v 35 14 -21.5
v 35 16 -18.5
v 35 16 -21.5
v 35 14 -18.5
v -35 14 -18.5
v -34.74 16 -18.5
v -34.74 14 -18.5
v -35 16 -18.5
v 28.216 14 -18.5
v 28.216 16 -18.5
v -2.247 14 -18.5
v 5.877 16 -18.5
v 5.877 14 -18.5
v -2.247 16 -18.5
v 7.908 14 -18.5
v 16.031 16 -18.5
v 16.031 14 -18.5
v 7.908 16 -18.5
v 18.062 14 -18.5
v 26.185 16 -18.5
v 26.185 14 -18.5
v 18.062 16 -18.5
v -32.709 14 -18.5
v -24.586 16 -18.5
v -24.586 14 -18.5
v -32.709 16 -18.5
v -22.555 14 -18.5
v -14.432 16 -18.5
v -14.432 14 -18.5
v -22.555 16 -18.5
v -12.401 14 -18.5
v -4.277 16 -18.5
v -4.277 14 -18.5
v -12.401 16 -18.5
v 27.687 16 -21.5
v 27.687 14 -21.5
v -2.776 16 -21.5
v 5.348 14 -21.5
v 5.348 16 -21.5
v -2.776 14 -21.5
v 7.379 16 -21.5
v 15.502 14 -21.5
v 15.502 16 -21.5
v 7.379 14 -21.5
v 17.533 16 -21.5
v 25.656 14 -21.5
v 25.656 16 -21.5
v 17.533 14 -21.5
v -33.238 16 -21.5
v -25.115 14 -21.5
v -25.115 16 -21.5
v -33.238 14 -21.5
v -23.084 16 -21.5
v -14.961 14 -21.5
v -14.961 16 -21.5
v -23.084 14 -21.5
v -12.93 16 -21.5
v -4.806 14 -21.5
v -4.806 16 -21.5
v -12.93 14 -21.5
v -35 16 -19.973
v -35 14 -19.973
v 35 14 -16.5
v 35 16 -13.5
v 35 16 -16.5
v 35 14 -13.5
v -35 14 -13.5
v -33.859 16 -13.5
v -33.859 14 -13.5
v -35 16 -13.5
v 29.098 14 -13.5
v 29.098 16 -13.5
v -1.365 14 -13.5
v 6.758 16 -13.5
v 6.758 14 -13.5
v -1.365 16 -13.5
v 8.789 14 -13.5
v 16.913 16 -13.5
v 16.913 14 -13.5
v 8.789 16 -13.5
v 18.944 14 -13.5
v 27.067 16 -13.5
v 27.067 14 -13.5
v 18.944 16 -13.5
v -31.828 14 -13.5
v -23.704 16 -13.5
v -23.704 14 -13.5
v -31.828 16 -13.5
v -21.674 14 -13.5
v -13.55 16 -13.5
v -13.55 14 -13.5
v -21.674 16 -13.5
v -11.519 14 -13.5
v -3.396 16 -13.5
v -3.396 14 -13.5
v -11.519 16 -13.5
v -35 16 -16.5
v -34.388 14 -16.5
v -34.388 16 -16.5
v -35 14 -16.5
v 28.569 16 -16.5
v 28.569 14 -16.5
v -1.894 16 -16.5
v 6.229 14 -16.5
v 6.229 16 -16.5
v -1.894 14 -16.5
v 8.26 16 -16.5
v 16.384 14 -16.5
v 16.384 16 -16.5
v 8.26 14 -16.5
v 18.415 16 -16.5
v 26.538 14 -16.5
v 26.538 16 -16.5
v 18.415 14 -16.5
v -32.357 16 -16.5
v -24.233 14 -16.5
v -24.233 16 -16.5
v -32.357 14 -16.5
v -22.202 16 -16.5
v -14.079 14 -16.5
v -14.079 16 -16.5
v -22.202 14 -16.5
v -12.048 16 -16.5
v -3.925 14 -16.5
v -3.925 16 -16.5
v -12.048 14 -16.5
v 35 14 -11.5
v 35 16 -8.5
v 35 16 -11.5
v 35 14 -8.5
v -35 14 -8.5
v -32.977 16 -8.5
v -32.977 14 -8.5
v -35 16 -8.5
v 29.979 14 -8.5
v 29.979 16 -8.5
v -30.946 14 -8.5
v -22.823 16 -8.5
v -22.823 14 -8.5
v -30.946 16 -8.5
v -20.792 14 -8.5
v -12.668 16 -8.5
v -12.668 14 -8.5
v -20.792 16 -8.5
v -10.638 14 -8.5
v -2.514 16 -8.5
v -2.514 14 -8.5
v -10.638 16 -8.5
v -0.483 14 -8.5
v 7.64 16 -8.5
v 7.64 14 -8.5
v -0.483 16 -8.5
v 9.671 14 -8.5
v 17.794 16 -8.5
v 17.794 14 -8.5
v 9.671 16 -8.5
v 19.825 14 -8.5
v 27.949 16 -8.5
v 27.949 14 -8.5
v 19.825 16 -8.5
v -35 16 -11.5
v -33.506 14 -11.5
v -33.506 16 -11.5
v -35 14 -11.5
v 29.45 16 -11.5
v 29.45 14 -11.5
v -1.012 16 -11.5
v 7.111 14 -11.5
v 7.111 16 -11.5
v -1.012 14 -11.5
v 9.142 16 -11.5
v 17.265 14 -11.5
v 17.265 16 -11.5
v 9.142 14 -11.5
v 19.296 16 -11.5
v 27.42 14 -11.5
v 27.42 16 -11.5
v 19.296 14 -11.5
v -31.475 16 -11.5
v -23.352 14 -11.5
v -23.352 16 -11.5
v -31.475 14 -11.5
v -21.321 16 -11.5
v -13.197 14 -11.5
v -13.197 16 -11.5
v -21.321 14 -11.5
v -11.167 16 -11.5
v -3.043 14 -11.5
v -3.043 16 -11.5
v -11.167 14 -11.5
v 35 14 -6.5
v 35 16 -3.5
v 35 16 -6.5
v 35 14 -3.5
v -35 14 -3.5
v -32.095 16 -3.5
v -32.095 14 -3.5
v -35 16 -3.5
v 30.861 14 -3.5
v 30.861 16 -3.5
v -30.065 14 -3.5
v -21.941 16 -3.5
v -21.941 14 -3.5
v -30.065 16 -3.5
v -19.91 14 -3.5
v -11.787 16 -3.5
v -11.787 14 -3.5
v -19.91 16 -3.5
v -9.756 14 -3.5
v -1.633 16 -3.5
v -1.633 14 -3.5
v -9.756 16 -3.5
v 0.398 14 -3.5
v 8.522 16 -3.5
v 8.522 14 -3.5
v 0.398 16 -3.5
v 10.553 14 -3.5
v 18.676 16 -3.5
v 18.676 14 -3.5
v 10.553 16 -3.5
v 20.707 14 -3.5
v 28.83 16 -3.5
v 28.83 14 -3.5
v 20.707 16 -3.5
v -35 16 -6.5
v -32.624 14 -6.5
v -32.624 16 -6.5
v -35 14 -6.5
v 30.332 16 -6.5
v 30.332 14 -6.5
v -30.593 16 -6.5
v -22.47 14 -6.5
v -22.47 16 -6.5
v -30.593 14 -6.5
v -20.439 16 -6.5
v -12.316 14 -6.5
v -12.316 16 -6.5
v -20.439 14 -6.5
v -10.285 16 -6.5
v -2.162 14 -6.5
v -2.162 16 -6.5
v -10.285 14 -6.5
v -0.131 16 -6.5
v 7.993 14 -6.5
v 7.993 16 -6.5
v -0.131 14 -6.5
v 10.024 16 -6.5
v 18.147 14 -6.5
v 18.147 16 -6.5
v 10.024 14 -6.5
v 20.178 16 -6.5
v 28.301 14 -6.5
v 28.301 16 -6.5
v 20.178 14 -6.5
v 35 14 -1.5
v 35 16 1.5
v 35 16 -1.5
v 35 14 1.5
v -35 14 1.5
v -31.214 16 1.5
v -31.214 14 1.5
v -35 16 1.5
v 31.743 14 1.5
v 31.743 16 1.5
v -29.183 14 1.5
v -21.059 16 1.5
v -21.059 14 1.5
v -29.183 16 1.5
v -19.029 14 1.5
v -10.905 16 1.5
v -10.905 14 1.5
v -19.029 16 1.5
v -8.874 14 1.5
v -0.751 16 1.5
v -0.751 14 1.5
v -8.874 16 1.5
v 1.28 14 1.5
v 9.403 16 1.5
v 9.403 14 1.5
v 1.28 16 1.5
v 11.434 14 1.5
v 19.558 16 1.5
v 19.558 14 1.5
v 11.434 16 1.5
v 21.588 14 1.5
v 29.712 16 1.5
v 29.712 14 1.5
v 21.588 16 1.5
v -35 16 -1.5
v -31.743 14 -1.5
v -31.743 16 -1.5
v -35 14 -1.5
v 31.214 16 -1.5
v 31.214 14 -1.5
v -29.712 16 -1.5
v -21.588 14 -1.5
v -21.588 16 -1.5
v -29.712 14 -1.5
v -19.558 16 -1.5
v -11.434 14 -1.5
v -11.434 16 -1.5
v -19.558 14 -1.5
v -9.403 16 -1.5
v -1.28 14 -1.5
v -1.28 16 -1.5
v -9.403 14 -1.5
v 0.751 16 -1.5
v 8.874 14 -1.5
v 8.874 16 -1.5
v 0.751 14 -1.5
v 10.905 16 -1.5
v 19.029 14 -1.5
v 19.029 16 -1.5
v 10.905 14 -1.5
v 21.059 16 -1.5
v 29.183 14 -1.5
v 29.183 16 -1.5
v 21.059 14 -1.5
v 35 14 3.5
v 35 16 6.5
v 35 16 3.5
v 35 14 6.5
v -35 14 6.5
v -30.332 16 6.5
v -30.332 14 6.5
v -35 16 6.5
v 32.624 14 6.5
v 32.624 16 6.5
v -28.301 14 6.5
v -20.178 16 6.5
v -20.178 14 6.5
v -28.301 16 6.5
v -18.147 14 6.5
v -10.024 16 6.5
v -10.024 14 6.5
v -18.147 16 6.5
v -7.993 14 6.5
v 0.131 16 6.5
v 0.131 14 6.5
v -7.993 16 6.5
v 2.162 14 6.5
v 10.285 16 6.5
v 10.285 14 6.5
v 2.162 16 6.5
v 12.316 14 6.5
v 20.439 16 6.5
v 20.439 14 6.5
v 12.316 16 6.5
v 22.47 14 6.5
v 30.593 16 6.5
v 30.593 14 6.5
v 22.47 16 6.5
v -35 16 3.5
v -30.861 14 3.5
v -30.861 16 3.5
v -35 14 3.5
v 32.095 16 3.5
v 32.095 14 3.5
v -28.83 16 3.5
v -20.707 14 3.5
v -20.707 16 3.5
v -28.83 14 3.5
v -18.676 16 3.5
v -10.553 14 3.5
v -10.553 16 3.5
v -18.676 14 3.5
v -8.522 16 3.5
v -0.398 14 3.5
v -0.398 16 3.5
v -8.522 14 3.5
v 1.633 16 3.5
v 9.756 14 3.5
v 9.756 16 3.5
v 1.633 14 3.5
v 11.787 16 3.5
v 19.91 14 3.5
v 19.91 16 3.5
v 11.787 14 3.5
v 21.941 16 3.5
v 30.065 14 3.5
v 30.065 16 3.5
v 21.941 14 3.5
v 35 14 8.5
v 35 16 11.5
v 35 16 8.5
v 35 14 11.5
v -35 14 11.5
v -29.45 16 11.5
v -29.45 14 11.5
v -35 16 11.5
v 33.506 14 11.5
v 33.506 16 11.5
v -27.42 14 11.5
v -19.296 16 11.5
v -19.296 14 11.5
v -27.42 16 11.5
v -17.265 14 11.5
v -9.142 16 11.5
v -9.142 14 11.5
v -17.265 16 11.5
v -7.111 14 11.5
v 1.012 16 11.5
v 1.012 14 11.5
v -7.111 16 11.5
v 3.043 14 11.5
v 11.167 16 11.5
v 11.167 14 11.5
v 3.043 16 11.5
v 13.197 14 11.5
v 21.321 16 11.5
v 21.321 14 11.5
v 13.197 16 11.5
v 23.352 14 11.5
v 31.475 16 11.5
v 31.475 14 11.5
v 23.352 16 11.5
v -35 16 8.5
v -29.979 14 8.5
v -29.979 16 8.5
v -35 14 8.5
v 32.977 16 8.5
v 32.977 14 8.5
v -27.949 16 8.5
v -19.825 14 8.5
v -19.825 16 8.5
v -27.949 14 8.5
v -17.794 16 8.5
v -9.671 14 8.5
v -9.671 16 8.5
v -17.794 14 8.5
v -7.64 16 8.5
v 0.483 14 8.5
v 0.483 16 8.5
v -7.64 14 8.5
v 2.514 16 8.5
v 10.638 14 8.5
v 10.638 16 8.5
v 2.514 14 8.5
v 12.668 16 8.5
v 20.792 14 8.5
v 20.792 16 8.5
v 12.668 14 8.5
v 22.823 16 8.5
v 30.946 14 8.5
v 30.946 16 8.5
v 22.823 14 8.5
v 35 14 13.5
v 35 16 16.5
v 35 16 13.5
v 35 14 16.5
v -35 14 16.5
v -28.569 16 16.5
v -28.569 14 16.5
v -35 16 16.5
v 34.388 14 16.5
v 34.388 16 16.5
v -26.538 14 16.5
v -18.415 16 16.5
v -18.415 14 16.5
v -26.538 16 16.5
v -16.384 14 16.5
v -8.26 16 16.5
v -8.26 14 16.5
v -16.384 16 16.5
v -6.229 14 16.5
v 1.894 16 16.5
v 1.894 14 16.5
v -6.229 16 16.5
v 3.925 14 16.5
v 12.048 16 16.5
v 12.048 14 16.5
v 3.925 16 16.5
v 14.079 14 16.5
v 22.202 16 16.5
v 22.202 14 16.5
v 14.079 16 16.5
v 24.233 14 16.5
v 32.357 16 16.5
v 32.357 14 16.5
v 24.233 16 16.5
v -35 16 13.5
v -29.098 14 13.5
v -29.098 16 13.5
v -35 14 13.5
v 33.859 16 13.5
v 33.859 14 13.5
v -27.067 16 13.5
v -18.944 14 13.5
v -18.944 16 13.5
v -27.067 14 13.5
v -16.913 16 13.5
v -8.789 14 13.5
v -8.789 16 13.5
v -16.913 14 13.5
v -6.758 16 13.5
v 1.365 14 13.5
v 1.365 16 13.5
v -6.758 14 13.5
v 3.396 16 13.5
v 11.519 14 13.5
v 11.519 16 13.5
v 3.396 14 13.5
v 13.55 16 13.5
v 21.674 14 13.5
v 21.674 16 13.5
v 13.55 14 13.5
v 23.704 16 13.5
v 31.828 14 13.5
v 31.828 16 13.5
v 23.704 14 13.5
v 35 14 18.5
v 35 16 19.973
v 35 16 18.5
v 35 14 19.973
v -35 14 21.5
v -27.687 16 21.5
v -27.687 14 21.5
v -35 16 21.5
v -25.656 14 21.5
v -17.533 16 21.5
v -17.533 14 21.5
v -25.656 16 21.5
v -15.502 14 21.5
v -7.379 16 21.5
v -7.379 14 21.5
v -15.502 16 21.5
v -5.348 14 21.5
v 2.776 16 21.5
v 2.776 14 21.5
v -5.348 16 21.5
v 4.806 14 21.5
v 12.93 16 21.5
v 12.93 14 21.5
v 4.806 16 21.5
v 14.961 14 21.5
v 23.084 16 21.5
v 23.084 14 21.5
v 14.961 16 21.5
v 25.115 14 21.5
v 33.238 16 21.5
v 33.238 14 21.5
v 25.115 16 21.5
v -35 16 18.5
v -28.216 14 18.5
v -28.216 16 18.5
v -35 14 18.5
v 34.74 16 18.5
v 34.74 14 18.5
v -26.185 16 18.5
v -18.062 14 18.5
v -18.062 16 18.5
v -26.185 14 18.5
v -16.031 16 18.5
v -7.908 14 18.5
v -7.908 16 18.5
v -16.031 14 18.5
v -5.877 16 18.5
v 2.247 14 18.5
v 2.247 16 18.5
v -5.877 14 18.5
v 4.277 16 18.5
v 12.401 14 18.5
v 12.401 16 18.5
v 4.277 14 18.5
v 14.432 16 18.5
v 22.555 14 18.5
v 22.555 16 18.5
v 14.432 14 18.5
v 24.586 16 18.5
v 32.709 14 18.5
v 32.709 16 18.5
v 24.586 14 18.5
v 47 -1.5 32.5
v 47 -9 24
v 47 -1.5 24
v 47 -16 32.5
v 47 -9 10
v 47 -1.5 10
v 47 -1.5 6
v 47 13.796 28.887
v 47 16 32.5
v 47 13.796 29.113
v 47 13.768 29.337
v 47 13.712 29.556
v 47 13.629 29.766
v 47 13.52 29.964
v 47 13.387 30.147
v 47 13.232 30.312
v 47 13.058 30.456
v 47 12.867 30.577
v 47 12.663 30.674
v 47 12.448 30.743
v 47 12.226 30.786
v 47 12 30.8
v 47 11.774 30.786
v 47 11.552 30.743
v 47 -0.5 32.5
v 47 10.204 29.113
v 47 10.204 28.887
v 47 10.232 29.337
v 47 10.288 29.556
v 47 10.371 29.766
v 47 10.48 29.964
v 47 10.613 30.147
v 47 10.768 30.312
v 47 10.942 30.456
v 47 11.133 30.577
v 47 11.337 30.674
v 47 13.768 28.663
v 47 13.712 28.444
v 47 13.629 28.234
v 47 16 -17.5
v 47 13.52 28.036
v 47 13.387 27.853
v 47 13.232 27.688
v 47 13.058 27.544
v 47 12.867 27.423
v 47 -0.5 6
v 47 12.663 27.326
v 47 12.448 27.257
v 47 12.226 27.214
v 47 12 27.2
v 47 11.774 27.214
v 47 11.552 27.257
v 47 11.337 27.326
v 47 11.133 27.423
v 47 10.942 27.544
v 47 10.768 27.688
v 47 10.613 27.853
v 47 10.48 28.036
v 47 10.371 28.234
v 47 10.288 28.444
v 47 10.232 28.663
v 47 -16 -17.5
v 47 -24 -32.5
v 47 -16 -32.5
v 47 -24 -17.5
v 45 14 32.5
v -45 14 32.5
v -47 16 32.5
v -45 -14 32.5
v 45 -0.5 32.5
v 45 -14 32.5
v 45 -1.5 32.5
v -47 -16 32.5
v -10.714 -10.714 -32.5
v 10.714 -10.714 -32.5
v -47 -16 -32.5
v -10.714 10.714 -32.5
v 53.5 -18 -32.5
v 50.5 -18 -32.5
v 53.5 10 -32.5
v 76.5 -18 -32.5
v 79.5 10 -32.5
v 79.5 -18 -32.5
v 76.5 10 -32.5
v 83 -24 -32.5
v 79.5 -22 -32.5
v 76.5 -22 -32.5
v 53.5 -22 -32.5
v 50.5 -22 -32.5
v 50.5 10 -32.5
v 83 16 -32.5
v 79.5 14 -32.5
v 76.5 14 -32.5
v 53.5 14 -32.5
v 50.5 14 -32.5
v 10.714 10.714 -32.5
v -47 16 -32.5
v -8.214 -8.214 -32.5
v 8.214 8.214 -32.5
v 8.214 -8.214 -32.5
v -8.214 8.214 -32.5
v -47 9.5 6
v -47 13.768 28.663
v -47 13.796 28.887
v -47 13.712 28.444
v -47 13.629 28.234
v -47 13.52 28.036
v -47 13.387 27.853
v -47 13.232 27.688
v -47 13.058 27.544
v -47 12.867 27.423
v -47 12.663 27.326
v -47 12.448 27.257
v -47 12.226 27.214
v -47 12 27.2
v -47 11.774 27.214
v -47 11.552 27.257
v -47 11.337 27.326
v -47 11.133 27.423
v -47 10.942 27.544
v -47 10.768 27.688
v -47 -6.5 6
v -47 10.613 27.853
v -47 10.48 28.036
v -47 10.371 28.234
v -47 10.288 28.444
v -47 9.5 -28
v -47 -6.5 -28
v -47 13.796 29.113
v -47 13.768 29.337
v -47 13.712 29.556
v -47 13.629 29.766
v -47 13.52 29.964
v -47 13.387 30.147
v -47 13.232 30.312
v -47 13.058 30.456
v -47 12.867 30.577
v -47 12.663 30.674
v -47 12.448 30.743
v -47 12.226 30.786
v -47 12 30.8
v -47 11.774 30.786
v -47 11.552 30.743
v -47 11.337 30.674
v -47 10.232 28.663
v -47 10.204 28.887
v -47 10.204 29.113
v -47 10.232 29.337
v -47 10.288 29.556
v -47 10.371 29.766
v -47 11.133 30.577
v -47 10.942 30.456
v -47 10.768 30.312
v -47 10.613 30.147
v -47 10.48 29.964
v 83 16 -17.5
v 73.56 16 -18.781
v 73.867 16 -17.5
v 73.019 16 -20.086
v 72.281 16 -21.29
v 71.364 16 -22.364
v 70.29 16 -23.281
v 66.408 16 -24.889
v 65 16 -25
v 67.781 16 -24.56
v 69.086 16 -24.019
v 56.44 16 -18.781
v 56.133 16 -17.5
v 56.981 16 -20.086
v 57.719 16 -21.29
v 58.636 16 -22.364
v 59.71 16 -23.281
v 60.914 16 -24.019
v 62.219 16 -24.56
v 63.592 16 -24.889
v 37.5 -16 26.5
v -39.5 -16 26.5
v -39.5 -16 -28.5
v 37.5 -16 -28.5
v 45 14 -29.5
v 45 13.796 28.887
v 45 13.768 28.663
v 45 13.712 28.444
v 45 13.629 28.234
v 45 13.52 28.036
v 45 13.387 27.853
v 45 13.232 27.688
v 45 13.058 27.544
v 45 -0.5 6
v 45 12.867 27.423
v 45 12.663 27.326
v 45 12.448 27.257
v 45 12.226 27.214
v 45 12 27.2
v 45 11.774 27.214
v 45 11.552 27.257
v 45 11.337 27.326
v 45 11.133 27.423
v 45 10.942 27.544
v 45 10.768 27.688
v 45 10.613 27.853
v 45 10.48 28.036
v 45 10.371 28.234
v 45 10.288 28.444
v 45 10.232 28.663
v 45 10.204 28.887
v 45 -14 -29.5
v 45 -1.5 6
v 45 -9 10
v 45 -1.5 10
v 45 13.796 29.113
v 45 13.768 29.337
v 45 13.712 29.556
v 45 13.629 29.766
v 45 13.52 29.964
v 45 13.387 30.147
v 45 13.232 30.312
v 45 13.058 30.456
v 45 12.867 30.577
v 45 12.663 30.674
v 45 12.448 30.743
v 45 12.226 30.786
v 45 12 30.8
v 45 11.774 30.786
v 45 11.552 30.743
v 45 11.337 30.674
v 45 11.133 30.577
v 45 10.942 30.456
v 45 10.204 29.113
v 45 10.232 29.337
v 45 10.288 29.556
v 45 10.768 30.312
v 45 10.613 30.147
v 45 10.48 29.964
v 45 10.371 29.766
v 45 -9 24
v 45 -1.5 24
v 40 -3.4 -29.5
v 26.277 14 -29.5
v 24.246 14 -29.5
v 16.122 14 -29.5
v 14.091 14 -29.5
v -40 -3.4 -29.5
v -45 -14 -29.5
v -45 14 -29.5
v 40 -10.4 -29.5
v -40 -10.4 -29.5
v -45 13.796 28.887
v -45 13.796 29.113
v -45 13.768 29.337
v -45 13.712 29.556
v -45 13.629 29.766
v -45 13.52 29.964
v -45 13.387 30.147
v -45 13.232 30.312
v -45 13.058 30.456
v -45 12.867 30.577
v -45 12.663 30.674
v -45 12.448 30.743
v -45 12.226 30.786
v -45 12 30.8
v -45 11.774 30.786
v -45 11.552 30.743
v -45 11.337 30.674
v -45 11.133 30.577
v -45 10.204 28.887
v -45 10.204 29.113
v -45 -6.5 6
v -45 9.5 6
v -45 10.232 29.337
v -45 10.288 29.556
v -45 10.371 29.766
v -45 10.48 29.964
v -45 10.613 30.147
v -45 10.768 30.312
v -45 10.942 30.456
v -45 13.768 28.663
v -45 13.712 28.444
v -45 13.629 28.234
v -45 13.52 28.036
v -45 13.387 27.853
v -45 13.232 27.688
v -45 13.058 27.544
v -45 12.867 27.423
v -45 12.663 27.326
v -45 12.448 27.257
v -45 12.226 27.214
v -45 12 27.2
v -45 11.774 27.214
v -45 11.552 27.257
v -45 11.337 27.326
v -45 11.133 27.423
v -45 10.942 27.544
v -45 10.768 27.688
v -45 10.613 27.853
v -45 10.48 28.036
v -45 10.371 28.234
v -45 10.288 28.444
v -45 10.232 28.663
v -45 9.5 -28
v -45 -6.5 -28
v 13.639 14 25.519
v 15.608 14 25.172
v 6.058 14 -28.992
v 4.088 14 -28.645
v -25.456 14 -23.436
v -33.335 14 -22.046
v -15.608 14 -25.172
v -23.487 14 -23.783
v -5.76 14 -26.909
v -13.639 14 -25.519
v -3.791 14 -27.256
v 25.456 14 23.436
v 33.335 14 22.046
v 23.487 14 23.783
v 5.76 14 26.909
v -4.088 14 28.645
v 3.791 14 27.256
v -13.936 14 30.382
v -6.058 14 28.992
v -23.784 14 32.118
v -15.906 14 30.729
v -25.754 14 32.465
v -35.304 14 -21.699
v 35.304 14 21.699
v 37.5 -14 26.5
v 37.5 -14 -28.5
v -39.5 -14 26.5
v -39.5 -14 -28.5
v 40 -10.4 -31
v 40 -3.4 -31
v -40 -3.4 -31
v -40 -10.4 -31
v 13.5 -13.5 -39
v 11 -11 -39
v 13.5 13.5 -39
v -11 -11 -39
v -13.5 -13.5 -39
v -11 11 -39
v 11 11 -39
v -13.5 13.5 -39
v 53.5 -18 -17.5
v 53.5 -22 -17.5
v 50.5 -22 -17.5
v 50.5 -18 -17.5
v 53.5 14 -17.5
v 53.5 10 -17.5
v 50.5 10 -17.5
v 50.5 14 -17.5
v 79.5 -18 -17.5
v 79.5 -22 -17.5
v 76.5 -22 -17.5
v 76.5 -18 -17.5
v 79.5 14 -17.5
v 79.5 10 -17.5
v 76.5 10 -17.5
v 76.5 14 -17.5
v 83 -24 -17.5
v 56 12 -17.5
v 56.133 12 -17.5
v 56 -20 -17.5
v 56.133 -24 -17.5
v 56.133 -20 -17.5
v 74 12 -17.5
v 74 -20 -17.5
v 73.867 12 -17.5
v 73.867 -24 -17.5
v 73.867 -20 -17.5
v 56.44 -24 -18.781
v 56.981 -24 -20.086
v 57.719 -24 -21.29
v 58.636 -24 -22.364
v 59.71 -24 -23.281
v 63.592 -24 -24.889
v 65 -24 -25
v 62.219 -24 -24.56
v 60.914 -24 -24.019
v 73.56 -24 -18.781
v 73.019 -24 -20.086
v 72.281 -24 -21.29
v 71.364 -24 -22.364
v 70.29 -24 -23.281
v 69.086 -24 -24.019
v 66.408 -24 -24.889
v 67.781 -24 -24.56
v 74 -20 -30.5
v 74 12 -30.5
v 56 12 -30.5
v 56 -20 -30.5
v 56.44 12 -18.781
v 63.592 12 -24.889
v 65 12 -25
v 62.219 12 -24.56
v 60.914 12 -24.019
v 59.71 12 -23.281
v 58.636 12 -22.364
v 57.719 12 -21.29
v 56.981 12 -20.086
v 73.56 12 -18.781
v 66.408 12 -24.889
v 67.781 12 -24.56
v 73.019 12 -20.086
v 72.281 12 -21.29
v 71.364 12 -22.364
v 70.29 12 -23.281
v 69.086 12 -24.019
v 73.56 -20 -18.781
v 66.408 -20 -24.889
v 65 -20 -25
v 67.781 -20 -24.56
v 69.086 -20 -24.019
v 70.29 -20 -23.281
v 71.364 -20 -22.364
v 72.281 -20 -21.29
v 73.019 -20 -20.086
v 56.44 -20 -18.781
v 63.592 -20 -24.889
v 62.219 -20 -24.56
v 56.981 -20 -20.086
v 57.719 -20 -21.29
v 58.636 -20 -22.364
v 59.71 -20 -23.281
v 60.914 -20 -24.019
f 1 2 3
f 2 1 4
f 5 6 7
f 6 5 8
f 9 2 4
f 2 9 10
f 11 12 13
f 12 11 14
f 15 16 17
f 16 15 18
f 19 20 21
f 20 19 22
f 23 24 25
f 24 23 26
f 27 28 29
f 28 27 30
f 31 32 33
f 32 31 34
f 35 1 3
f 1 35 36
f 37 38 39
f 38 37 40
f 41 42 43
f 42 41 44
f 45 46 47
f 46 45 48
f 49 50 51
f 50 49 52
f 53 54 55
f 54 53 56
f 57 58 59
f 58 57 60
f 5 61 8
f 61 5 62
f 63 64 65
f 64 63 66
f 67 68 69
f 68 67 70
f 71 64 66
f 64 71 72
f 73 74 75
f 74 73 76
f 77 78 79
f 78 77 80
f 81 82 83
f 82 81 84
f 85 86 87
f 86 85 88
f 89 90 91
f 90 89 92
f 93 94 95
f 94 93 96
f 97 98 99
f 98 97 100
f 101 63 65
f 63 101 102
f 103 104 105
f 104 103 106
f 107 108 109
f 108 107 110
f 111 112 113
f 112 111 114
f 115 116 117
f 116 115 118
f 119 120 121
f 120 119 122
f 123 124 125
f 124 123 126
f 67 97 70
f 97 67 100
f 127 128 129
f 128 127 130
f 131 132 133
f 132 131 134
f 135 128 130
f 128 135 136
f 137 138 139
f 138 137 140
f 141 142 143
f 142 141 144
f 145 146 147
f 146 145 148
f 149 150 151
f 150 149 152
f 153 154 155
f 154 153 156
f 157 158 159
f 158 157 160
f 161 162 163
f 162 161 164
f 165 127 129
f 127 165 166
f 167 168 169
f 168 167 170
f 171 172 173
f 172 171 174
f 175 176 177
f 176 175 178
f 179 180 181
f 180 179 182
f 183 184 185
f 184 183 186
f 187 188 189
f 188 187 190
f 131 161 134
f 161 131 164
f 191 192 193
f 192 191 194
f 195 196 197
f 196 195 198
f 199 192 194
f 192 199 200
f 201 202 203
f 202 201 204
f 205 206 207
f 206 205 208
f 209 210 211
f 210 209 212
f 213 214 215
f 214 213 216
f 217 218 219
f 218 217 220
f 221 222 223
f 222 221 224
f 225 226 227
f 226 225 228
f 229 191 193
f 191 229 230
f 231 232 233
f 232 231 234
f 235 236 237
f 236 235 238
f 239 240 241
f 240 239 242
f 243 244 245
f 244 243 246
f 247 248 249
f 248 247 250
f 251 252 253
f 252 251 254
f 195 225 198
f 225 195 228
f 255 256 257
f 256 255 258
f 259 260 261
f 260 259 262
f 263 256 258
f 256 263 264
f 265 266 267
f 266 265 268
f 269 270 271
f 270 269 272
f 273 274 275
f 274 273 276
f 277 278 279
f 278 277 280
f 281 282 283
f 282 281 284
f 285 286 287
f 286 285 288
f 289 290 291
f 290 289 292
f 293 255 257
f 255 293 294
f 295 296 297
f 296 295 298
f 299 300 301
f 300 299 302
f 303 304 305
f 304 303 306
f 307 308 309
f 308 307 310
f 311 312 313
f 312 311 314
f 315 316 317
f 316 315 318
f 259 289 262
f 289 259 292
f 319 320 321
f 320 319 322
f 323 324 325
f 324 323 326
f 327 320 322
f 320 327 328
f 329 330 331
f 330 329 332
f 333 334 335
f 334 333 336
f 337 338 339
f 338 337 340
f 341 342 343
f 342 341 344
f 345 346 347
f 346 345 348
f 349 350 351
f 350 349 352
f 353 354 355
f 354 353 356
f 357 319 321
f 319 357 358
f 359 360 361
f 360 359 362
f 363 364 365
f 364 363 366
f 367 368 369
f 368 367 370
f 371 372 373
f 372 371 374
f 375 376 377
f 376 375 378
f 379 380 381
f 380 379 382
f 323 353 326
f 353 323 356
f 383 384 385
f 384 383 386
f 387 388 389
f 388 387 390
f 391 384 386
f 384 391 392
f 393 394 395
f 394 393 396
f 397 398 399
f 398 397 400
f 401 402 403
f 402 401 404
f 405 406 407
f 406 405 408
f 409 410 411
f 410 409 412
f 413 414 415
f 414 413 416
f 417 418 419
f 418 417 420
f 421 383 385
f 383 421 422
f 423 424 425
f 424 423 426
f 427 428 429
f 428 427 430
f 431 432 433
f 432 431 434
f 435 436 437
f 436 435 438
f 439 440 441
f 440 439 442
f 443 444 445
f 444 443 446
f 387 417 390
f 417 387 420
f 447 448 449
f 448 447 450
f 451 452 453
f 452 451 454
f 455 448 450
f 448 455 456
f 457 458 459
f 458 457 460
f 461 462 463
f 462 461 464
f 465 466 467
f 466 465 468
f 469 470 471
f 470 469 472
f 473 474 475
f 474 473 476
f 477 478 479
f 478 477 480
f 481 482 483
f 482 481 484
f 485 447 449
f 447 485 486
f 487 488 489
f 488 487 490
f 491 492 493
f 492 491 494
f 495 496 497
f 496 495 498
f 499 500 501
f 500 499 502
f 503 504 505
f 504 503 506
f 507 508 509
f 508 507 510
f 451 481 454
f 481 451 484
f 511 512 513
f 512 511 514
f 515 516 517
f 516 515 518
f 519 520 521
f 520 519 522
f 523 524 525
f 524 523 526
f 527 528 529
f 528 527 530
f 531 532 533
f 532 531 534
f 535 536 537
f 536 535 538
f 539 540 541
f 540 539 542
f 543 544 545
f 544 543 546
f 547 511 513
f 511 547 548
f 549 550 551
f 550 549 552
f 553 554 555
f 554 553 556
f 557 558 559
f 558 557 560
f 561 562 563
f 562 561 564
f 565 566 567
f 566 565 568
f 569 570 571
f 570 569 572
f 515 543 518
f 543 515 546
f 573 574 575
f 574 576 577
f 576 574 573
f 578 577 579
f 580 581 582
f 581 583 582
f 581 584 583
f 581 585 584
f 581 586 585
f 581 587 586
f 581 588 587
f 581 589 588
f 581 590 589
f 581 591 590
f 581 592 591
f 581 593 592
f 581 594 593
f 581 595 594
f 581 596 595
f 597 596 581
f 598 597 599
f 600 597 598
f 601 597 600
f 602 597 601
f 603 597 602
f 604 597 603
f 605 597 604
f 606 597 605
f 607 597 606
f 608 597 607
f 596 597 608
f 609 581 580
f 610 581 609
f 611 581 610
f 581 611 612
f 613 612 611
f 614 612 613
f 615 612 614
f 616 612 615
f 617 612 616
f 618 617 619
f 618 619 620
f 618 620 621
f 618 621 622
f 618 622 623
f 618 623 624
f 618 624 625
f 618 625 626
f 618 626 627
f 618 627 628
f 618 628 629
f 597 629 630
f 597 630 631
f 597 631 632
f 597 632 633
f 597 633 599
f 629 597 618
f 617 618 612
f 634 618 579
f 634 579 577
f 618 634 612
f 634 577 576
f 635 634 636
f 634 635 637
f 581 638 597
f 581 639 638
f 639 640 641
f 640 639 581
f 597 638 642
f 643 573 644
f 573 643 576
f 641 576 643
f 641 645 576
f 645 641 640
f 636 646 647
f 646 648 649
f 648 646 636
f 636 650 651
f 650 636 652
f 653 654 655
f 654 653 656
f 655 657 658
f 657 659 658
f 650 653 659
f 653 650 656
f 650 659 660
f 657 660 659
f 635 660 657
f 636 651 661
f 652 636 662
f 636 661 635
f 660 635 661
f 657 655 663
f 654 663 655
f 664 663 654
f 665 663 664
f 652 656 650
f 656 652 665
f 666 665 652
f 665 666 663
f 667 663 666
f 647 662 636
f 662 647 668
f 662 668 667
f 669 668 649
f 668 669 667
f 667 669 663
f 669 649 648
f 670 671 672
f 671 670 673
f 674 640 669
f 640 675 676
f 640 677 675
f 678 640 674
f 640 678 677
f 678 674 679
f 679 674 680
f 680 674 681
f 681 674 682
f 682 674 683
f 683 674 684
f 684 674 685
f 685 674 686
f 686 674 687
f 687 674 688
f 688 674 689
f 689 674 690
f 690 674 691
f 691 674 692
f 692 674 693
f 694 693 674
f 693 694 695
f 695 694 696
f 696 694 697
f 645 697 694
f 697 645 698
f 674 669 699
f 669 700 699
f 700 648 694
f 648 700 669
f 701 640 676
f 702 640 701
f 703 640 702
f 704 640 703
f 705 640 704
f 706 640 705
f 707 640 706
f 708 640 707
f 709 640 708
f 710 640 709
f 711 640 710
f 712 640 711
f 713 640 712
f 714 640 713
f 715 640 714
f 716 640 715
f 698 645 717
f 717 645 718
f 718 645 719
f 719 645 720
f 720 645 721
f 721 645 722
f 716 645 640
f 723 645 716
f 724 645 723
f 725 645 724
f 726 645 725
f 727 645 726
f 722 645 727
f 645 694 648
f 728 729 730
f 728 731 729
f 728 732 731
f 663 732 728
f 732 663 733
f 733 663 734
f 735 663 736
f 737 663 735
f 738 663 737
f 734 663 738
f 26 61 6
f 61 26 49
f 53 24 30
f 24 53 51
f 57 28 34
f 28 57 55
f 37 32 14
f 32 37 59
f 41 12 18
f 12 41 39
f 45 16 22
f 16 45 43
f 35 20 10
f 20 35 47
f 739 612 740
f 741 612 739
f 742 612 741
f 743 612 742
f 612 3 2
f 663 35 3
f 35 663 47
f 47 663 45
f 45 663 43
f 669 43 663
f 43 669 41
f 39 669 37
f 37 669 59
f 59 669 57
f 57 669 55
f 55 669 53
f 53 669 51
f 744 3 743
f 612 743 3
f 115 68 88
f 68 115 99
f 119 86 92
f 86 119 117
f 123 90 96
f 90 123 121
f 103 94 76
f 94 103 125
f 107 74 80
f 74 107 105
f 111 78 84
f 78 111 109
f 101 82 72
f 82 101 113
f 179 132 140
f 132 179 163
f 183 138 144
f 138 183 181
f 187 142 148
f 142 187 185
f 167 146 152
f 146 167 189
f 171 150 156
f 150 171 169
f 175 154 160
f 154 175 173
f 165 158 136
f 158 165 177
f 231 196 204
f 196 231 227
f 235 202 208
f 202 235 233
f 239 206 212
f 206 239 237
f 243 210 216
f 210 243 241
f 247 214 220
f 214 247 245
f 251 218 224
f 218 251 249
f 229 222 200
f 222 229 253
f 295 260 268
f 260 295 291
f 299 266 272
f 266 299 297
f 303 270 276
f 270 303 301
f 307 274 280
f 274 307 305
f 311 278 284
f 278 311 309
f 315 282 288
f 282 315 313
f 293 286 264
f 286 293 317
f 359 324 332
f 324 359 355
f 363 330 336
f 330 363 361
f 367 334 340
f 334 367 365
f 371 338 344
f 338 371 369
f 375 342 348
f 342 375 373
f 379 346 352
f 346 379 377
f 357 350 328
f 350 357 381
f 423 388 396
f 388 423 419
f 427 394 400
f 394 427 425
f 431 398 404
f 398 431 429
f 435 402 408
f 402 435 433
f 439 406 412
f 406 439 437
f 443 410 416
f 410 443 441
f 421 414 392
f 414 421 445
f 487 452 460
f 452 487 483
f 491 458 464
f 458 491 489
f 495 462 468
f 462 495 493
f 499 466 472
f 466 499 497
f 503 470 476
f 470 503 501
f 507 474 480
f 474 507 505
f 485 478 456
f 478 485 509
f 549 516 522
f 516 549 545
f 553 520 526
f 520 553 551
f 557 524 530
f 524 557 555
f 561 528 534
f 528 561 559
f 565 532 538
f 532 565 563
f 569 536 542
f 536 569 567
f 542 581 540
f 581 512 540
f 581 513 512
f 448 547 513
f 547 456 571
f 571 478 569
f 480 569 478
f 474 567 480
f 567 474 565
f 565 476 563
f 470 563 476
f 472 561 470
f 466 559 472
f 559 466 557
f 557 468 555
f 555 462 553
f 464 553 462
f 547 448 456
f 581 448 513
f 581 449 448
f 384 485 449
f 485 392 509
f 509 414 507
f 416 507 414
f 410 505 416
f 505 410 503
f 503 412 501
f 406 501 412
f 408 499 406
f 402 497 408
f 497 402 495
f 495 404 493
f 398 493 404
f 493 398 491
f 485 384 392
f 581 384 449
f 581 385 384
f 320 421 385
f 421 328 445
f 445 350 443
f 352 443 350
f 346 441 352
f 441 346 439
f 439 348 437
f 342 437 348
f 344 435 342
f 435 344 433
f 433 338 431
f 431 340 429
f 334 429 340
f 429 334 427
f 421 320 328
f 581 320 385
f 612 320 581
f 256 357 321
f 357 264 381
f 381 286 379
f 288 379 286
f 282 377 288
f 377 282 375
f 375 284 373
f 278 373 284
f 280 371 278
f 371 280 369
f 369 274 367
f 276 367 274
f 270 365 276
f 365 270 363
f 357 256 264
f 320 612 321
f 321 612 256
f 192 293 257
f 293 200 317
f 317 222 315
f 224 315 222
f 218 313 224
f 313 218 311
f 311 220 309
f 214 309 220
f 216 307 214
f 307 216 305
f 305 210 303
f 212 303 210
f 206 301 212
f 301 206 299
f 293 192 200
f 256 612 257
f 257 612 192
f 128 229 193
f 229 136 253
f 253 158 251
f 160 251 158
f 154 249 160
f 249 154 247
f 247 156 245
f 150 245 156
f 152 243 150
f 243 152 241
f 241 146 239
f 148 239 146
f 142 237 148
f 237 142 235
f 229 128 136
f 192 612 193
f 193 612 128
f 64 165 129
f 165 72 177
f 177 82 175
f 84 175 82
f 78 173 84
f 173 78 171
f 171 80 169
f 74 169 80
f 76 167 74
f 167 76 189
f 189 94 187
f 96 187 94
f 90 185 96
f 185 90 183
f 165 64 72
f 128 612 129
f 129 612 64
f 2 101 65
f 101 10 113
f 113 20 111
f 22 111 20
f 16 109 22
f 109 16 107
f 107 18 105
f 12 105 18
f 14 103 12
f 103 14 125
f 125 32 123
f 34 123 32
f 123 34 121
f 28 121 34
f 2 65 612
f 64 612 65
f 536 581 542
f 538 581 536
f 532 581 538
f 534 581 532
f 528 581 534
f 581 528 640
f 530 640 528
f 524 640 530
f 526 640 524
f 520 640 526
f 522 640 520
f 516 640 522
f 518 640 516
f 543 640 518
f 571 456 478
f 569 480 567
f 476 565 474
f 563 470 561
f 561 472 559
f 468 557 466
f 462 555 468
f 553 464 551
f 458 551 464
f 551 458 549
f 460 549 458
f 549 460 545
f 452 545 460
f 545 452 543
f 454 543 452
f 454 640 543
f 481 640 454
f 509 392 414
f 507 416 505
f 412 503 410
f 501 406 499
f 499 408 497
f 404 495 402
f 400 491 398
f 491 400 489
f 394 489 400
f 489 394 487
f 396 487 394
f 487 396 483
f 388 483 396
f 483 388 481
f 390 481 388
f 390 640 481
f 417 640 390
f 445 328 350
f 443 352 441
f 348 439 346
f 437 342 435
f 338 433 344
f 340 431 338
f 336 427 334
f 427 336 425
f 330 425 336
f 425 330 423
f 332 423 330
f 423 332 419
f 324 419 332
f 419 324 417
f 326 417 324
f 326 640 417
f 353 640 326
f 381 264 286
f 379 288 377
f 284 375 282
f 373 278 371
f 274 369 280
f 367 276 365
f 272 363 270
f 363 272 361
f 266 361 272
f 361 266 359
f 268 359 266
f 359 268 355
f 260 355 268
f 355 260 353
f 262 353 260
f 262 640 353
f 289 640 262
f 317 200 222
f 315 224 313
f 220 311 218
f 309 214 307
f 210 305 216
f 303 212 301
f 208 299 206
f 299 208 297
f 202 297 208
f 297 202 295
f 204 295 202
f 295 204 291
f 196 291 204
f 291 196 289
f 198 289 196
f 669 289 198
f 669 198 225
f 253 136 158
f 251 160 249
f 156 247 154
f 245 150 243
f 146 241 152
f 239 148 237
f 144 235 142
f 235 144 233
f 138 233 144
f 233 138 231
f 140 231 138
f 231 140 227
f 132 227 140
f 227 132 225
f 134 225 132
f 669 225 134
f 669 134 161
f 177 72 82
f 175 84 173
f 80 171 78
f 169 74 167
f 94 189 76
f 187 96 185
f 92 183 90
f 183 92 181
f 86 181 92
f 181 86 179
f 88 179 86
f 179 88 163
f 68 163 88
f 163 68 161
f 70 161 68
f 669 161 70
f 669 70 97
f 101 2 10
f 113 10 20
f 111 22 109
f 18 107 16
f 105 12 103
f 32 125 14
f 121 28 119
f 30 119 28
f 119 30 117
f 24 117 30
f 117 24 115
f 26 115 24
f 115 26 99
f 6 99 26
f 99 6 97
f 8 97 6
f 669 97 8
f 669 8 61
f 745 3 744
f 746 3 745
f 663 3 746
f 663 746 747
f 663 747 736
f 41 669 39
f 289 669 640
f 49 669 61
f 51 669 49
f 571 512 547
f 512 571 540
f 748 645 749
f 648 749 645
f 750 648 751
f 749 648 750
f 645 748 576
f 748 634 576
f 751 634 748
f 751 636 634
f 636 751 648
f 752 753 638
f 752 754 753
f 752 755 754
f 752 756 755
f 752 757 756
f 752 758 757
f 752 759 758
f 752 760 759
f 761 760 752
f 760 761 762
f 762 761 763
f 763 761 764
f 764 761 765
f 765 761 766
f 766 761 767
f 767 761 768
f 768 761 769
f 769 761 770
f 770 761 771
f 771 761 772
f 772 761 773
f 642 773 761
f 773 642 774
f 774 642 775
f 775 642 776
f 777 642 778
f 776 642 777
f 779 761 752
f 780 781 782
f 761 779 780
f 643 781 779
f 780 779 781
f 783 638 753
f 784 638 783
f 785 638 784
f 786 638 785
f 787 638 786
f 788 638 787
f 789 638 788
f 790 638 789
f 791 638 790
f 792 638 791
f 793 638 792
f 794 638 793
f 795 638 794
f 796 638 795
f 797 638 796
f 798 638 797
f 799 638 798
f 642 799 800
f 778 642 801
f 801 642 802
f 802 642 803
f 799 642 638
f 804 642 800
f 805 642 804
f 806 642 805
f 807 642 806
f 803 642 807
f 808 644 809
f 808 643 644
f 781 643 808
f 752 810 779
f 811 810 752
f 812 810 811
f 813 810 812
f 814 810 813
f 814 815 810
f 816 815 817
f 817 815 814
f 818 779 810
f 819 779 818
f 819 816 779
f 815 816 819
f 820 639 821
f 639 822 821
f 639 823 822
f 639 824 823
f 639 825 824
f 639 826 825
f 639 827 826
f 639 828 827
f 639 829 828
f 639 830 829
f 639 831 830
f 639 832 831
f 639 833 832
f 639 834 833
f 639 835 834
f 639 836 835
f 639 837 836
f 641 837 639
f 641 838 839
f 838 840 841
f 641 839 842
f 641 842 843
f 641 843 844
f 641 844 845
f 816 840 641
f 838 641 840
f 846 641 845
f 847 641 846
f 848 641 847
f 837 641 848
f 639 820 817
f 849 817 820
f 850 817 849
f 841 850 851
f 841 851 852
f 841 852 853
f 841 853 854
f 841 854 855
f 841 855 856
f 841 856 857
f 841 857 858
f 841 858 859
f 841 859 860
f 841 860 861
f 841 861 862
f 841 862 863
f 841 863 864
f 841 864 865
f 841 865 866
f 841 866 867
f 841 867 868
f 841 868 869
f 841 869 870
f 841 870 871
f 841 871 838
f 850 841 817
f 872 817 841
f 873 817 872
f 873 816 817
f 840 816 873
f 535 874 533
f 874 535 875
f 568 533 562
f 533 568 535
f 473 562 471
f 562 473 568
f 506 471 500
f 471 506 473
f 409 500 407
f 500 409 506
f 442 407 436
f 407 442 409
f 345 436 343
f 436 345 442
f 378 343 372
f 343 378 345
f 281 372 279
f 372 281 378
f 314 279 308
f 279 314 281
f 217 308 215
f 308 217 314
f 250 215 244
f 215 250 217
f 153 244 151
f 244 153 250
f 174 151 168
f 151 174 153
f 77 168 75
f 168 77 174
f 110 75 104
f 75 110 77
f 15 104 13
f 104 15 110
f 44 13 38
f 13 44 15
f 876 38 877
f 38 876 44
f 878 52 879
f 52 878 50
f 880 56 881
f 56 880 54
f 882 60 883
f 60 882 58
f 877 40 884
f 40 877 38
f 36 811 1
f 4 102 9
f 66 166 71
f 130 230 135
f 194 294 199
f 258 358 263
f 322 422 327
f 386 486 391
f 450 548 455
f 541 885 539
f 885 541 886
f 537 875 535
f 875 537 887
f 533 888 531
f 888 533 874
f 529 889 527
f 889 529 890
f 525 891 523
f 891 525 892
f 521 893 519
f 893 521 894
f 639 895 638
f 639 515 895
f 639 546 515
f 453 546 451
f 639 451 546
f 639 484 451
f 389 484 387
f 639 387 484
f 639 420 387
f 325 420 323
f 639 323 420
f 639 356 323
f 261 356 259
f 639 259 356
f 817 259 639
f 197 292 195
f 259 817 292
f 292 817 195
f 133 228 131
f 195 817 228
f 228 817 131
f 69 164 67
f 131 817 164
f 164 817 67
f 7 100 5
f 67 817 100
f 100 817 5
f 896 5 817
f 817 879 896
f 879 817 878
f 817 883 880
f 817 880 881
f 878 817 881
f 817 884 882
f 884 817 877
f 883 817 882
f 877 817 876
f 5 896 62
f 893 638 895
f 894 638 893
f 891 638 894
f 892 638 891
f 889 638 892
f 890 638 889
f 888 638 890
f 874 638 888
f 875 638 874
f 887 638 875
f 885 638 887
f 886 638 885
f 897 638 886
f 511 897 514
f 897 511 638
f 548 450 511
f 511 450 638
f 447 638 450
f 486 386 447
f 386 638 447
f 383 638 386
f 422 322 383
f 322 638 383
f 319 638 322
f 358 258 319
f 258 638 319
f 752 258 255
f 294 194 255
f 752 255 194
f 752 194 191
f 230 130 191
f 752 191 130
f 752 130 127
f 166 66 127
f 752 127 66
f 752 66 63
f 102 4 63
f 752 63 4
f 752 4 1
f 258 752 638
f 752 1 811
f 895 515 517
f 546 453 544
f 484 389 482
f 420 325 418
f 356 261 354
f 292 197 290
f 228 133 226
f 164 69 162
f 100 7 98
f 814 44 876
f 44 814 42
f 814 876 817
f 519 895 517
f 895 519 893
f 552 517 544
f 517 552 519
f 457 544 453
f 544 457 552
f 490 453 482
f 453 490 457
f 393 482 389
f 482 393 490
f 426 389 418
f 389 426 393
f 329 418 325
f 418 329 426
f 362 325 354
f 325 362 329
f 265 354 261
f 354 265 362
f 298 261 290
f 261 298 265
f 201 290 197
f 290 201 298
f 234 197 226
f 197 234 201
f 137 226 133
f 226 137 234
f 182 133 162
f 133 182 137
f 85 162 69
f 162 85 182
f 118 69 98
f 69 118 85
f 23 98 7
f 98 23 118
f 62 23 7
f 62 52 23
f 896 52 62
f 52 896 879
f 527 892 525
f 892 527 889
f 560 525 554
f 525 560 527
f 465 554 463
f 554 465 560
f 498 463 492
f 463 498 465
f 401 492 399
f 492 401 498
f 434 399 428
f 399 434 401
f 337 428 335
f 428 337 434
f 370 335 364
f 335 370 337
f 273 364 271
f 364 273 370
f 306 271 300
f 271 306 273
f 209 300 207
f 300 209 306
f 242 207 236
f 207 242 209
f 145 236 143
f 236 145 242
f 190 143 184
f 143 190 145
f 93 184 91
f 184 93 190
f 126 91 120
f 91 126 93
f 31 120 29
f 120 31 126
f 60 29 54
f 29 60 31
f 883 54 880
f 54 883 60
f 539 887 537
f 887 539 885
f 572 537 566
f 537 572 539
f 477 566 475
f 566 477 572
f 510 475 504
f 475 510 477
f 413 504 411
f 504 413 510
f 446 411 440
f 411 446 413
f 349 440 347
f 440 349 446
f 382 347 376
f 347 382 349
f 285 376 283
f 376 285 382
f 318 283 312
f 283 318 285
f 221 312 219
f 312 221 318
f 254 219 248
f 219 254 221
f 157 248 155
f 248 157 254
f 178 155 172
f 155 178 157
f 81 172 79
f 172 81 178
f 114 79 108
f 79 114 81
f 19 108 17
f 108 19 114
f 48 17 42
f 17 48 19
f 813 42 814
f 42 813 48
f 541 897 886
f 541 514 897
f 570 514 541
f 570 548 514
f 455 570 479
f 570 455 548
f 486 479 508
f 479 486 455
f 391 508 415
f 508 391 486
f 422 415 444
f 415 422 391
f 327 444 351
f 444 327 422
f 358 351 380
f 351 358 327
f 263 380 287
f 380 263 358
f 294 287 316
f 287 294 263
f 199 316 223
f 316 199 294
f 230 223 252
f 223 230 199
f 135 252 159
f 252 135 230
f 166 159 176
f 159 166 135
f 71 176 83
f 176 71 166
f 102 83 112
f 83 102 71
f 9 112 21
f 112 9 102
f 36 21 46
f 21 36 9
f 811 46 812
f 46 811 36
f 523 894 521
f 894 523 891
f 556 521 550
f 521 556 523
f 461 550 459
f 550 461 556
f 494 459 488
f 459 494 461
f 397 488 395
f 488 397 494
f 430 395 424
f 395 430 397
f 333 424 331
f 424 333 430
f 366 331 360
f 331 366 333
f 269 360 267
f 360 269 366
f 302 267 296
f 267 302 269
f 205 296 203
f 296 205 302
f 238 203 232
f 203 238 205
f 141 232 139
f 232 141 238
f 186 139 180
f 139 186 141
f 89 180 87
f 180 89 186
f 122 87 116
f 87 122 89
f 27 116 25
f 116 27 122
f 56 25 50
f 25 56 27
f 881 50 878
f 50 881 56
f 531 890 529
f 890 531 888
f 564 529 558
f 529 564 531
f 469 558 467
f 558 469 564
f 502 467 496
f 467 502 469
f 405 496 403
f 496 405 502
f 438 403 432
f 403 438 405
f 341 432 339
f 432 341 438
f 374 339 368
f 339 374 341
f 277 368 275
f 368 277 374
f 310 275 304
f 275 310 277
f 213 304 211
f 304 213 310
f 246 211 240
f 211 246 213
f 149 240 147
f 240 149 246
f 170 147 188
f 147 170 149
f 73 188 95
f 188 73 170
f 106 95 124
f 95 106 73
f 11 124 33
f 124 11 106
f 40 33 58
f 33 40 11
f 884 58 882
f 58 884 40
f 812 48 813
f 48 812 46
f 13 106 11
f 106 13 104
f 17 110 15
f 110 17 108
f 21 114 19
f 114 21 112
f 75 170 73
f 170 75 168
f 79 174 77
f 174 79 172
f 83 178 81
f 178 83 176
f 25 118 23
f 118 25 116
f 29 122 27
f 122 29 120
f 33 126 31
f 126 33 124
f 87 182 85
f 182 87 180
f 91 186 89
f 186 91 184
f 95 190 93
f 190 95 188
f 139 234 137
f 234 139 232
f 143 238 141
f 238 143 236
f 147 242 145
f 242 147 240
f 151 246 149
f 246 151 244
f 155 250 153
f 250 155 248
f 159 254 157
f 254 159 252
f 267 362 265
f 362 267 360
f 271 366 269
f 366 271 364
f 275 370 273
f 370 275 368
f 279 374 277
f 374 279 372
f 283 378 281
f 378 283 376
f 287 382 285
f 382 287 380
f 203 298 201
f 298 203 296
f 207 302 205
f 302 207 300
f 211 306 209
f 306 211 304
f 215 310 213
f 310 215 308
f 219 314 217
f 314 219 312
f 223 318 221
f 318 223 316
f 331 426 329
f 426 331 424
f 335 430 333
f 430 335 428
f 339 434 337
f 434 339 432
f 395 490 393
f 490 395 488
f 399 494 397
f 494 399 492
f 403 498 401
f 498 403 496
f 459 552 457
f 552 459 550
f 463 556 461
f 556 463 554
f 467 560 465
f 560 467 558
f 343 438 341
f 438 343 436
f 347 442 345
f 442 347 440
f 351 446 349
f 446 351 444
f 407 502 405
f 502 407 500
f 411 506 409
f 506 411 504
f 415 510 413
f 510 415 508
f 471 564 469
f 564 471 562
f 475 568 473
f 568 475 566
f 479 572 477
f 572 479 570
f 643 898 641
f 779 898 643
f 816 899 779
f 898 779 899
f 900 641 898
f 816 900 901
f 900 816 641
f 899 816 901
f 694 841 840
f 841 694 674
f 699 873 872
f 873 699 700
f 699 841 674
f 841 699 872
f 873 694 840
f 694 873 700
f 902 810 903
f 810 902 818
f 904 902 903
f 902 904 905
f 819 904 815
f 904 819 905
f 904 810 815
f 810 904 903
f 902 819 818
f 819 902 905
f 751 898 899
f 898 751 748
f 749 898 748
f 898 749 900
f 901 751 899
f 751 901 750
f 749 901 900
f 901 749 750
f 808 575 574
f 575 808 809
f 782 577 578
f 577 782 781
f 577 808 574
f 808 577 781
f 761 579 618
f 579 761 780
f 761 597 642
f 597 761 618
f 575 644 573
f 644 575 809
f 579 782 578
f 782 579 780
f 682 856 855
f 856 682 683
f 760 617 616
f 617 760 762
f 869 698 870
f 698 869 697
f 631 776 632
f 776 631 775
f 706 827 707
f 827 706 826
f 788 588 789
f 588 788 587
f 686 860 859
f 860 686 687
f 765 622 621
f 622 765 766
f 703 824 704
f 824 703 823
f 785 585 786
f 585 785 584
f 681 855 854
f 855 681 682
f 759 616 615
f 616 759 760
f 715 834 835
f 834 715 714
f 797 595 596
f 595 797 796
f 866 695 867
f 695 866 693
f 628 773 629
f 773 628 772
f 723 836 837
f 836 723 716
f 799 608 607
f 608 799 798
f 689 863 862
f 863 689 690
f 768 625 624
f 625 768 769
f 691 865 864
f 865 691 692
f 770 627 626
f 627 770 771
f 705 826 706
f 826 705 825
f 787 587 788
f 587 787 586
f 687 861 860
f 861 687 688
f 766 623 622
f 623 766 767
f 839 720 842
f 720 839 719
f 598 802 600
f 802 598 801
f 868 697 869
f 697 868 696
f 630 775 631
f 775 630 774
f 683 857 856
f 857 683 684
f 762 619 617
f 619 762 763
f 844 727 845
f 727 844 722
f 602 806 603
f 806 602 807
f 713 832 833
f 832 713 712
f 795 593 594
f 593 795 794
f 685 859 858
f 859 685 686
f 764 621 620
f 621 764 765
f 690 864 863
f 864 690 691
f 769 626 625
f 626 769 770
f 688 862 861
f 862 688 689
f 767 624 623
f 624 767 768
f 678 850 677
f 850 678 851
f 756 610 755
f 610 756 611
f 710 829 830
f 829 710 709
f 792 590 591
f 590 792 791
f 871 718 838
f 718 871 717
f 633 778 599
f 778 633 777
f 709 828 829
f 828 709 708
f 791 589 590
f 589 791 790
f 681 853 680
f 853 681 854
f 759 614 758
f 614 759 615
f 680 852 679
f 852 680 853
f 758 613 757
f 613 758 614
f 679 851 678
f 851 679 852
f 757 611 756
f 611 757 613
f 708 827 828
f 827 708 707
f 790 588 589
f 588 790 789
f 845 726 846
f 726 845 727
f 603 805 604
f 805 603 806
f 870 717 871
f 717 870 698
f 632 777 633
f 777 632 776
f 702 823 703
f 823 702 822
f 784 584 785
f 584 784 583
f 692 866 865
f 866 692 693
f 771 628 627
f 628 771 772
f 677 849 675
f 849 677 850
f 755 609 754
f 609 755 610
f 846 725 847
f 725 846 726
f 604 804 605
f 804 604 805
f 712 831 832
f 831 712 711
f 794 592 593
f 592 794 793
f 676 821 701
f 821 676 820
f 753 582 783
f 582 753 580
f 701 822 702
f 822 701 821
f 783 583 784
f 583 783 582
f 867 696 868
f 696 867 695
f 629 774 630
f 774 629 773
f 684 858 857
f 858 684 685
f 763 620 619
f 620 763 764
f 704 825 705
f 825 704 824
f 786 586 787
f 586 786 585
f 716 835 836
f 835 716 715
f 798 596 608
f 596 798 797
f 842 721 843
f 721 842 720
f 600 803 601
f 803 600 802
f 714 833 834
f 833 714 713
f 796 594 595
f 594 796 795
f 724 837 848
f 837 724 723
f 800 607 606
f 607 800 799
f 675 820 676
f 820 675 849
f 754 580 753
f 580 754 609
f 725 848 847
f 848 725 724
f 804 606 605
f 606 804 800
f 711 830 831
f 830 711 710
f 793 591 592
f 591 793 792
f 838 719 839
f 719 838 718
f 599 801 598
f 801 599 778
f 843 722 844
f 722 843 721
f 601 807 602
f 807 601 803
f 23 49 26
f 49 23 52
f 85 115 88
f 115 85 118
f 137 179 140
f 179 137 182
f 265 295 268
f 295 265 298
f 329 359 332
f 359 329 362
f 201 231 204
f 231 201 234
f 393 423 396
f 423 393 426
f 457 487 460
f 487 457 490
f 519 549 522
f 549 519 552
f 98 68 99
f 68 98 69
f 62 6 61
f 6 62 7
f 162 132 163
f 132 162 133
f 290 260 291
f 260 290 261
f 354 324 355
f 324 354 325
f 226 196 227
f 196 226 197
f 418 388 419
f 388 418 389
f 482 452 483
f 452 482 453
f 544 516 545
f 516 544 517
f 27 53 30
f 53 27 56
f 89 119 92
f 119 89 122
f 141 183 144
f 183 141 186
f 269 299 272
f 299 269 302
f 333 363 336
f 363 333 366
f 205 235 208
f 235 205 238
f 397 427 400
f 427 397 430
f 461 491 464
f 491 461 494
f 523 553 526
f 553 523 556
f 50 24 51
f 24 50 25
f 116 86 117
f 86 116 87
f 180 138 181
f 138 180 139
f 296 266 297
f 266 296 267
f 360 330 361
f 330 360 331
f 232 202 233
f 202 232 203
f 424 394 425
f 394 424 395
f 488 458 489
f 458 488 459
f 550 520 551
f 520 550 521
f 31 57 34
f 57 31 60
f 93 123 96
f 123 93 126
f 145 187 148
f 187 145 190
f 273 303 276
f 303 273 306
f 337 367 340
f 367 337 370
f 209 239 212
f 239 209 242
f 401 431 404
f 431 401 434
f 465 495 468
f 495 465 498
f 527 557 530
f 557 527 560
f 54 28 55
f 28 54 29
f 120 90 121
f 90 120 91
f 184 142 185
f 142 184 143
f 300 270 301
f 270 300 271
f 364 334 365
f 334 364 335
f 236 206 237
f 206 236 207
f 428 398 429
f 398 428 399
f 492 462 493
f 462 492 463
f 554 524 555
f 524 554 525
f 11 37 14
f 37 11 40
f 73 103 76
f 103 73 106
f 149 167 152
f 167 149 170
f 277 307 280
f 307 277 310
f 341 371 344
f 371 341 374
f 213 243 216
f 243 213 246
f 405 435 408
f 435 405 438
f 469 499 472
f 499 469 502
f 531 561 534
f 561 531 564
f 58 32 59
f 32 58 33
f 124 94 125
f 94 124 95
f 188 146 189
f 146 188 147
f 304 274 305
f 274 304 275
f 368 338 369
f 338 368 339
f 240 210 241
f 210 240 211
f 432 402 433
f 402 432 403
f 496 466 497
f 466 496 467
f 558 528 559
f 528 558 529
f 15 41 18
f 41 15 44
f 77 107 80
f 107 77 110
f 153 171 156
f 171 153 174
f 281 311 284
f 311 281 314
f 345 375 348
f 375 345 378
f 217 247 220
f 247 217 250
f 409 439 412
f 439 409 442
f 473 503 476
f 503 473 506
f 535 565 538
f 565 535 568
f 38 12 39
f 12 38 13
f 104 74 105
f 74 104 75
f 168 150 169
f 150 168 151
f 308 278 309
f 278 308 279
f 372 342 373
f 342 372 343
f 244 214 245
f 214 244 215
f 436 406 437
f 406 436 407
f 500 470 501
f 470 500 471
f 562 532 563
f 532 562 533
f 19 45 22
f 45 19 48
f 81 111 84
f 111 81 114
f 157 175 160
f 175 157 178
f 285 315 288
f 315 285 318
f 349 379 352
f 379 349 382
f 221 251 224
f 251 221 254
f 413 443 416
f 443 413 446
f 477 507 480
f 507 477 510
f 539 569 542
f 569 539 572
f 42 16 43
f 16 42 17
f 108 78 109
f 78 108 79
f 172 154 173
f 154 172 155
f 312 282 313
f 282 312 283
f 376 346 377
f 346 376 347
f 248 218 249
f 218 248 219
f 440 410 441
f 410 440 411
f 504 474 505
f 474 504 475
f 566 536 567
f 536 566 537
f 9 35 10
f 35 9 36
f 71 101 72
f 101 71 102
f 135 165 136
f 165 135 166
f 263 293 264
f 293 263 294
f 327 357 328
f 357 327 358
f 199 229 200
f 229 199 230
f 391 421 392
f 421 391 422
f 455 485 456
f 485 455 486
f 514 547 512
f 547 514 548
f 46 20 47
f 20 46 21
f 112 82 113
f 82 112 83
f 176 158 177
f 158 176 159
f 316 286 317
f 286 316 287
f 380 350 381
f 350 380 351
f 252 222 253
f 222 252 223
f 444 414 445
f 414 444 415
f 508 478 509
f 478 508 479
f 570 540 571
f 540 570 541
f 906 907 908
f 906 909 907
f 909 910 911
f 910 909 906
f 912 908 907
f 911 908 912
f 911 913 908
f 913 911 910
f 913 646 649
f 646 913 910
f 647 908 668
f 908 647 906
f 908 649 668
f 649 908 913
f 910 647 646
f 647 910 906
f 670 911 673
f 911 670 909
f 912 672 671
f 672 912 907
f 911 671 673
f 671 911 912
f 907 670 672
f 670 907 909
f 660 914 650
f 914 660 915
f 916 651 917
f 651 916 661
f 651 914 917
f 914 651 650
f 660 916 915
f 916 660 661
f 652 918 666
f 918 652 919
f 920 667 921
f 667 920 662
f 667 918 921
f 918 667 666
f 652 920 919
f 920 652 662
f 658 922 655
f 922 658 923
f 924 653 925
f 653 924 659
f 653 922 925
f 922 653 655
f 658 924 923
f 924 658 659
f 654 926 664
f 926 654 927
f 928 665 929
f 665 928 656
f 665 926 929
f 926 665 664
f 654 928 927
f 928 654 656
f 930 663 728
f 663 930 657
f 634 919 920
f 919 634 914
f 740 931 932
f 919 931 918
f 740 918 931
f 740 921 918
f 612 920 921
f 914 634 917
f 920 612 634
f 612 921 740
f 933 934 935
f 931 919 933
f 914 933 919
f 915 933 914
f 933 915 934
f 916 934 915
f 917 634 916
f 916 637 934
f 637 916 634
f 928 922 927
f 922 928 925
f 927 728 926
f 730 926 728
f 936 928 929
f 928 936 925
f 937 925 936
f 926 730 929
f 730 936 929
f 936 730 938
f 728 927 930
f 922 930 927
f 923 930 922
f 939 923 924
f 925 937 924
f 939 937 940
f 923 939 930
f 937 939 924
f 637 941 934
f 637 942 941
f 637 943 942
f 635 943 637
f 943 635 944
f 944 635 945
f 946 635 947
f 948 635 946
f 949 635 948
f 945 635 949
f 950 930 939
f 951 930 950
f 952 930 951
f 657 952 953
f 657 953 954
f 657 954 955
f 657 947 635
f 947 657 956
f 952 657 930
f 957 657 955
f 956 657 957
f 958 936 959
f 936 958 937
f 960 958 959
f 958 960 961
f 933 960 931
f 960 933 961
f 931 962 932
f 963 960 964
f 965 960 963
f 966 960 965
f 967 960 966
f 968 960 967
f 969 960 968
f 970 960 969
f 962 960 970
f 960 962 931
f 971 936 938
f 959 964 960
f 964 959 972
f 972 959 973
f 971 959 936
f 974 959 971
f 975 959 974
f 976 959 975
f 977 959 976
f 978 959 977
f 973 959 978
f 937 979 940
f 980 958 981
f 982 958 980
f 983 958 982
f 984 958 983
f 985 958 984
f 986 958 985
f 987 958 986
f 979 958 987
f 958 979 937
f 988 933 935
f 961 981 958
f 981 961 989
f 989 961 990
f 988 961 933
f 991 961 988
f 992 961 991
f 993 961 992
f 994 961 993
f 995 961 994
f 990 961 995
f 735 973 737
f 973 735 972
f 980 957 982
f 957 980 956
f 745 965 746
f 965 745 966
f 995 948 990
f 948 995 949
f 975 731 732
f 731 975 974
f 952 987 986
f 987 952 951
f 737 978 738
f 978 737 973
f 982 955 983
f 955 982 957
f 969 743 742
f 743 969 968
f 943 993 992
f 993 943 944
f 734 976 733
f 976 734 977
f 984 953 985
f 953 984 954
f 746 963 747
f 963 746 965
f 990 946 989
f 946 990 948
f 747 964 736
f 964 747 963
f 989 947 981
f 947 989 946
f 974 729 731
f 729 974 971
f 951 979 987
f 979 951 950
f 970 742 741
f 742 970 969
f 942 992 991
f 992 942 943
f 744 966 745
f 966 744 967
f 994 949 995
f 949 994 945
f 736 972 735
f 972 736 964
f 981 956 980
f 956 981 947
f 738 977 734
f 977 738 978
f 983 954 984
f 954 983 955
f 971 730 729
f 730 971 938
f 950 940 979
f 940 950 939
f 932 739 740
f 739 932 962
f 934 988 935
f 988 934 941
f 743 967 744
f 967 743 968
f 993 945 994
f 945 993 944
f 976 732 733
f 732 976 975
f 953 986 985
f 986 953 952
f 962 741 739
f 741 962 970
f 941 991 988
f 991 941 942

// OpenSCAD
// mount a raspberry pi with a 3 in monitor on a tripod
// also supports a selfy stick. I know this sounds strange
// Author: Hao Chen
//
// License: any
//
//
// this is for Amazon Basic model  https://www.amazon.com/gp/product/B00XI87KV8 

module tripod (){
	difference(){
	linear_extrude(height = 7, scale = 21/27) square(27, center = true);
	linear_extrude(height = 7, scale = 16/22) square(22, center = true);
	}
}

module selfy (){
	difference(){
		cube([36,40,15],center=true);
		translate([0,0,2])cube([18,32,15],center=true);
		translate([0,0,9]) rotate([90,0,0]) cylinder(r=9, h=50,center=true, $fn=40);
		for (i=[-1,1]){ 
			for (j=[-1,1]){
			translate([13*i,16*j,0])cube([3,4,30],center=true);//zip tie 
			}
		}
	}
}

module rpi_case(){
	difference(){
		cube ([94, 32, 65], center=true);
		translate([0,0,5])cube ([90, 28, 69],center=true);
		translate([-40,1.5,-11])cube([20,16, 34], center=true); // usb ports
		translate([0,-6.9,-21]) cube([80,7,20],center=true);// lcd board groove
		translate([-1,-10,-1])cube([77,20,55],center=true);// lcd
		translate([44,-5,17]) cube([10,8,14],center=true);// power cord
		translate([44,-1,20]) cube([10,1,28],center=true);// camera cable 
		translate([0,0,29])screw();
		for (i = [1:9]) {
			translate([0,10,-25+i*5]) cube([70,20,3],center=true);// heat exhust  
		}
	}
	for (i = [1:7]) {
			rotate([0,10,0])translate([-40+i*10,15,0]) cube([2,2,55],center=true);// heat exhust  
		}
}

module top_cover(){
		difference(){
			intersection(){
			cube ([98.5, 36.5, 14], center=true);
				translate([0,0,-8])rotate([0,90,0]) cylinder(r=22,h=100,center=true);
			}

			translate([0,0,-3]) cube ([95.5, 33.5, 18], center=true);
			translate([0,0,-4]) screw();
			for (k=[1:3]) translate([0,-16+ k*8,0]) cube([90,3,14],center=true);
		}
}

module screw(){
	translate([0,12,0]) rotate([0,90,0]) cylinder(r=1.8,h=100,center=true, $fn=50);
}

//translate([0,0,33])top_cover();
rpi_case();
translate([0,0,-39])tripod();
translate([65,-4,-25])selfy();
